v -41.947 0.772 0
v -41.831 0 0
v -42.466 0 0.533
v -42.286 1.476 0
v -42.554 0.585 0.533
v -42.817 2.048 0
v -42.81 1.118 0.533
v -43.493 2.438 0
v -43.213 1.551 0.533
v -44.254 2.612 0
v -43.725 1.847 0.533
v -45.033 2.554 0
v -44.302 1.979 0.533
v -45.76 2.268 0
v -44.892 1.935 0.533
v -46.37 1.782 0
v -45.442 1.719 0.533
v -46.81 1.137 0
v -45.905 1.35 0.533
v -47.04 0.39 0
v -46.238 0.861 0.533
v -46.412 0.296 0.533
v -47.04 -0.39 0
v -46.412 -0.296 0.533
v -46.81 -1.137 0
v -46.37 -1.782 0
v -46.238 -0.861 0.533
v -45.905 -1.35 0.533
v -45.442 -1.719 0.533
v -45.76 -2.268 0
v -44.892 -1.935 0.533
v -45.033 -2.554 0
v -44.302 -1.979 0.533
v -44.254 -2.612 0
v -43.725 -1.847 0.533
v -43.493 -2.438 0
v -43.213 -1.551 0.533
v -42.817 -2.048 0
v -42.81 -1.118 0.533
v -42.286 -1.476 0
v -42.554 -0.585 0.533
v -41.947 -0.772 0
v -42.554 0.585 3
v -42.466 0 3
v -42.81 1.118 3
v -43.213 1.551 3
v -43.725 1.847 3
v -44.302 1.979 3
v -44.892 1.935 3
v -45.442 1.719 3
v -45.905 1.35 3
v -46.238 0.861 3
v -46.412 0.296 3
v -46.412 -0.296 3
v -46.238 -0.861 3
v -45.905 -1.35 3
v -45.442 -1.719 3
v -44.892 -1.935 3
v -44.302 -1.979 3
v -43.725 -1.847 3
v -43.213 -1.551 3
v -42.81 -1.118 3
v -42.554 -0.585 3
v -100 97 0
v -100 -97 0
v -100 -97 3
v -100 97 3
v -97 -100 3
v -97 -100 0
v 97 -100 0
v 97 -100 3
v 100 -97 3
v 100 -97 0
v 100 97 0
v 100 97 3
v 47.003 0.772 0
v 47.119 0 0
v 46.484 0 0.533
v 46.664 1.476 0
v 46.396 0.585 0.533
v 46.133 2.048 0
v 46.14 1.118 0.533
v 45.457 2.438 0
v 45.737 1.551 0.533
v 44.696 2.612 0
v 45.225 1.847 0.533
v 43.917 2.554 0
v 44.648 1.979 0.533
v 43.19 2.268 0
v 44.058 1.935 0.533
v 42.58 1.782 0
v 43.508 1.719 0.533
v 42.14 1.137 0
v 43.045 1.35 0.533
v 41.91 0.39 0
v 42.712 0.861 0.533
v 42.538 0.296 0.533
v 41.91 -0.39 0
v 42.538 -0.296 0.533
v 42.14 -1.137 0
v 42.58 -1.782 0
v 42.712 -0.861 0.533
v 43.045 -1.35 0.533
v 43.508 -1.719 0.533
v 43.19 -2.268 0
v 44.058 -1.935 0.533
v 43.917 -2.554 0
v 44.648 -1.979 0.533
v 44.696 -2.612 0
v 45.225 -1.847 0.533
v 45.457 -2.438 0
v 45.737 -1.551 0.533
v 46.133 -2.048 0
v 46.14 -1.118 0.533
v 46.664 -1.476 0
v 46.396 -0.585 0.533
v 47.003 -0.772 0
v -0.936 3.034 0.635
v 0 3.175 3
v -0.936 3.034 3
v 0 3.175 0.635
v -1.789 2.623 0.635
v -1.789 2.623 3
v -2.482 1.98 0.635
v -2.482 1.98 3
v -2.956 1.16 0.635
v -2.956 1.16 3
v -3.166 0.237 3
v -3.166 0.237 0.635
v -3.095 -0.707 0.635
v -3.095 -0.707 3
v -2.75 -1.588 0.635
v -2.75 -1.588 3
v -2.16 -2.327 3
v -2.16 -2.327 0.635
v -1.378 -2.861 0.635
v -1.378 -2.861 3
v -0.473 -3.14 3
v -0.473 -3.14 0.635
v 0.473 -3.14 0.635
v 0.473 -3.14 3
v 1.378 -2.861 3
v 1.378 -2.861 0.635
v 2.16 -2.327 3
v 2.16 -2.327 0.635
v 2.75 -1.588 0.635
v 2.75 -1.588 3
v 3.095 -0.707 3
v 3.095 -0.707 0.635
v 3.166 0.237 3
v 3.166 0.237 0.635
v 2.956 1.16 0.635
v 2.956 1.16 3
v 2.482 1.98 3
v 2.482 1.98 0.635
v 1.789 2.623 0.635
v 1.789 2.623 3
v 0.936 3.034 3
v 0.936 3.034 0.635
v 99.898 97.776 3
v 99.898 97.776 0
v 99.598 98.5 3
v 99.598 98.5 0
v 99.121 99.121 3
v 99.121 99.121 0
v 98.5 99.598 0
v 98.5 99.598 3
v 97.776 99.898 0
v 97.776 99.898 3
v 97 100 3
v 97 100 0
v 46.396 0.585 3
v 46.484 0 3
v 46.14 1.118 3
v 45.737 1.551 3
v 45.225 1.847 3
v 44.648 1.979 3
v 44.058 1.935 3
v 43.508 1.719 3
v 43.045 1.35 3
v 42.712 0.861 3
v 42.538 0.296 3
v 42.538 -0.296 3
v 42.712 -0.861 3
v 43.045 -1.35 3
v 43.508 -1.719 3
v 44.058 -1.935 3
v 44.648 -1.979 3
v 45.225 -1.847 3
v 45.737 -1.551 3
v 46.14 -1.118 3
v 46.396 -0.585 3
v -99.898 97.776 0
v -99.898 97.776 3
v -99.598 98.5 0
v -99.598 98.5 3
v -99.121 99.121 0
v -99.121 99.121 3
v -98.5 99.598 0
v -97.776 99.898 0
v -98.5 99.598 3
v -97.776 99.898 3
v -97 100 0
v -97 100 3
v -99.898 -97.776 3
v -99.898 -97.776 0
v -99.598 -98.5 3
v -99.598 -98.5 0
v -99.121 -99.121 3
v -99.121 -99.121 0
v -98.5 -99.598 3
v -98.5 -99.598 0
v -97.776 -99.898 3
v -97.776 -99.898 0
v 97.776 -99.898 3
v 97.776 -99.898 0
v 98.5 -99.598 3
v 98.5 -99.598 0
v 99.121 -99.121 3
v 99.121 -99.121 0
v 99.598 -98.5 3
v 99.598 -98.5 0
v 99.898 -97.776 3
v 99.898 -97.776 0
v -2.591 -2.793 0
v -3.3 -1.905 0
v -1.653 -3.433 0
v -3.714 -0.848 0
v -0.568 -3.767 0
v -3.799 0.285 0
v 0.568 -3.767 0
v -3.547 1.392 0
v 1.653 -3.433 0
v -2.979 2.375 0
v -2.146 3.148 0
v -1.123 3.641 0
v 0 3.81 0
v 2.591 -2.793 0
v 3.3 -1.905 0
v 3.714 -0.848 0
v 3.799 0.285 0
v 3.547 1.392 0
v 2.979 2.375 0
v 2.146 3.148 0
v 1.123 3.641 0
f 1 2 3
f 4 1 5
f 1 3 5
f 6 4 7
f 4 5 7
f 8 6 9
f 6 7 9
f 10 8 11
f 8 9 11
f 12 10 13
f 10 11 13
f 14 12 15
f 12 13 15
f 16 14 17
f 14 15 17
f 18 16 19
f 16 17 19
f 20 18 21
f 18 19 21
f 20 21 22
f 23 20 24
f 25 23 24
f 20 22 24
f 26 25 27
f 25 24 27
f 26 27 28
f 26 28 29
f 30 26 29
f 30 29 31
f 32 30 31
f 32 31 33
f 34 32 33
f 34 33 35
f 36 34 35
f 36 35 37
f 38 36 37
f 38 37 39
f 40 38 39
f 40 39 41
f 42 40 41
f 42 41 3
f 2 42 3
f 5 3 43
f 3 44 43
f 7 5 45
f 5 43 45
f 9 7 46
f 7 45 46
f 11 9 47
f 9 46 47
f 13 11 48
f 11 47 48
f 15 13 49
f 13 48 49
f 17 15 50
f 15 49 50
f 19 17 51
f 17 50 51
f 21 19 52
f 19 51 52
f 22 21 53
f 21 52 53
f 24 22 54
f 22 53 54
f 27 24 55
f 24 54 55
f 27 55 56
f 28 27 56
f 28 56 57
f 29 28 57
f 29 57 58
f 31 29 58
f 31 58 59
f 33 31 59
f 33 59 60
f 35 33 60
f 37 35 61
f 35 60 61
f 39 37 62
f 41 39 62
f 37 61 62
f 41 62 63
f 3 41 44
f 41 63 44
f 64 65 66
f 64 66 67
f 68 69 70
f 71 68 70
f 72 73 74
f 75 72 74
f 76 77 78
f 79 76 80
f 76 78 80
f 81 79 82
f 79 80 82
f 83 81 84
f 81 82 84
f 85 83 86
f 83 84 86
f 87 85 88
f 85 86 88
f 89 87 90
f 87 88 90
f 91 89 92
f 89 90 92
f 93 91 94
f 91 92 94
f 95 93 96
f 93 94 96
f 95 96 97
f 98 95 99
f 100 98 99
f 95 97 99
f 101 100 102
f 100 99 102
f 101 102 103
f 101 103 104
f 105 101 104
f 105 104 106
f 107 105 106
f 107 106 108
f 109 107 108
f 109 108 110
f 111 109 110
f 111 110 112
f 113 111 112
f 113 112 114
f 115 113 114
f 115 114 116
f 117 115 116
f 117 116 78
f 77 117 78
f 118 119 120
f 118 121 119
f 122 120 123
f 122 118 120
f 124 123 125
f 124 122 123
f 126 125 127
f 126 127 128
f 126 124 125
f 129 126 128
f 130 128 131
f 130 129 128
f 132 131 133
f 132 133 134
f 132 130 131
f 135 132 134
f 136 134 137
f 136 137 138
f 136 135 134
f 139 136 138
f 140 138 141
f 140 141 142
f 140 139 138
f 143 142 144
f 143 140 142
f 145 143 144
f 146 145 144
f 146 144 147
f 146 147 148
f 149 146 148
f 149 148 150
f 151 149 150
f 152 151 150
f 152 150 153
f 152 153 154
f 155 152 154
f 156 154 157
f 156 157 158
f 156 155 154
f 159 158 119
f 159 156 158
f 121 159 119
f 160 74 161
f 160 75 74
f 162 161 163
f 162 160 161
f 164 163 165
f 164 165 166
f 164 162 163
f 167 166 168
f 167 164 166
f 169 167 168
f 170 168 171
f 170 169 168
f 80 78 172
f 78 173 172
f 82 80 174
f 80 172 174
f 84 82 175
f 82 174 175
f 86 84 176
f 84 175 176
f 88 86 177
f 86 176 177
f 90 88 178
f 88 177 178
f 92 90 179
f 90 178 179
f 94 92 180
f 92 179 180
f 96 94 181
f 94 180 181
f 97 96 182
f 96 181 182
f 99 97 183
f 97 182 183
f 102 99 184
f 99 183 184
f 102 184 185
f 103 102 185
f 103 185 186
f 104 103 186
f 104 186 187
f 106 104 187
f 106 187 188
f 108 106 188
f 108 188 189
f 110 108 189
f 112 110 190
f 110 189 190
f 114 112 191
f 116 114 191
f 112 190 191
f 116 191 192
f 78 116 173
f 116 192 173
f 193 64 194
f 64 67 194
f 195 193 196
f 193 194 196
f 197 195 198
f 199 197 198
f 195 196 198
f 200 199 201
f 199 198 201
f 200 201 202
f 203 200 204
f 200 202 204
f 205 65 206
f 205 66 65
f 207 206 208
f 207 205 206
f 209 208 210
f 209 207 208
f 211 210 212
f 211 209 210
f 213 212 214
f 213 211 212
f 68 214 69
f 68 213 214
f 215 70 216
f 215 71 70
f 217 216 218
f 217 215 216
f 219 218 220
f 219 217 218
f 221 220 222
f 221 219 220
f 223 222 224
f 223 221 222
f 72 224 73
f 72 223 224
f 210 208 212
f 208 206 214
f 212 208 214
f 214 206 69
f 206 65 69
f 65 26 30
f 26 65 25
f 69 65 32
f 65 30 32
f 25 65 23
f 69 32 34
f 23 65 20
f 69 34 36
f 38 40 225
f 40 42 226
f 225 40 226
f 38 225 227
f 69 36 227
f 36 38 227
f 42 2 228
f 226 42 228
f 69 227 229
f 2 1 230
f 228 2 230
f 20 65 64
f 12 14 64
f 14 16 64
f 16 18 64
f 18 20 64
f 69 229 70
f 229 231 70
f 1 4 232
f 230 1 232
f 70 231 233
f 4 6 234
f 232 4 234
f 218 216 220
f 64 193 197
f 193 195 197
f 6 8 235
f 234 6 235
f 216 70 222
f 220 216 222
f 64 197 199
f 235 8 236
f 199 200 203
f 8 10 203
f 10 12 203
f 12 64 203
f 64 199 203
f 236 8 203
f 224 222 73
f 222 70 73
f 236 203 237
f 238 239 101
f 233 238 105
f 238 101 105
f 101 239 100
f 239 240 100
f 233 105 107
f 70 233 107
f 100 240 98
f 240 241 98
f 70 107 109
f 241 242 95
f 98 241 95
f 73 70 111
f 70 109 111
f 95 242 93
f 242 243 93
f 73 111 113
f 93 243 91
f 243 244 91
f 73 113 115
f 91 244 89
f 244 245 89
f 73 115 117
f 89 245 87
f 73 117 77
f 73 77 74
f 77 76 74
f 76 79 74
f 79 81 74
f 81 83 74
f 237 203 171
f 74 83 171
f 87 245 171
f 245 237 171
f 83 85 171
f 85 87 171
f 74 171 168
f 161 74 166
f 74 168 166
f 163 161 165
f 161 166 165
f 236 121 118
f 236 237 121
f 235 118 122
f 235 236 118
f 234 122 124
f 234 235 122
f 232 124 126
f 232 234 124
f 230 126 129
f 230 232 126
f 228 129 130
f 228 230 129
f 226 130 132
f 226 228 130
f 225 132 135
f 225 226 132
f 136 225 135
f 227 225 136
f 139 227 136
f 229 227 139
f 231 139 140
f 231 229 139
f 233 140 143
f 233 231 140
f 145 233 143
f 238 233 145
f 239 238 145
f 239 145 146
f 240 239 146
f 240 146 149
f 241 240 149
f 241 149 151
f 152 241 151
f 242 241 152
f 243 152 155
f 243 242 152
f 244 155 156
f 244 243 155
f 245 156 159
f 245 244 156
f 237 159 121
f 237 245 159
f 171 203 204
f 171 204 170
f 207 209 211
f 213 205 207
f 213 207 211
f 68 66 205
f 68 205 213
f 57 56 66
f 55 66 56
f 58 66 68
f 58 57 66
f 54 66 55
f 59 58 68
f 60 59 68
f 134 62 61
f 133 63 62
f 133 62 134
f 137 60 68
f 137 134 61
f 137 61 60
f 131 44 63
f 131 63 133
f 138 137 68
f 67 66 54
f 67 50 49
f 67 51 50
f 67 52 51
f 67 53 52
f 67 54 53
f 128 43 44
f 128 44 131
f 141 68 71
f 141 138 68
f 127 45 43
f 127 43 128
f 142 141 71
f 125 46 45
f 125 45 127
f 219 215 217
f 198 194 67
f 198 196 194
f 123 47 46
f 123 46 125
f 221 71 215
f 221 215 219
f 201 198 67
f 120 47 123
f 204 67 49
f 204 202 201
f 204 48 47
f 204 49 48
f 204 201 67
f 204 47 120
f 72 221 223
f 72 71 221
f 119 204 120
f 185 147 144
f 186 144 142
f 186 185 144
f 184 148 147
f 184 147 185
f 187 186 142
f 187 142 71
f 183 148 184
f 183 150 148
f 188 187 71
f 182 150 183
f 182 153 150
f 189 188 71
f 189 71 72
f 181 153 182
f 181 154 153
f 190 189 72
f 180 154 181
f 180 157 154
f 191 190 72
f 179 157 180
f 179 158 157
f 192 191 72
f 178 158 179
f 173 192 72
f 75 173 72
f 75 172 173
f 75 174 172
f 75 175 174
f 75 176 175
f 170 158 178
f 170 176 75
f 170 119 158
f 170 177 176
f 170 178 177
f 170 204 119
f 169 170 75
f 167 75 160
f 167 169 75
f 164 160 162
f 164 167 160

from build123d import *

# Parameters (mm, degrees)
BASEPLATE_W                   = 200
BASEPLATE_H                   = 200
BOSS_EXTRUDE1_DEPTH           = 3
FILLET1_R                     = 3
F_5_32_DOWEL_HOLE_D           = 3.96875
F_5_32_DOWEL_HOLE_CSINK_D     = 5.23875
F_5_32_DOWEL_HOLE_CSINK_ANGLE = 100


with BuildPart() as part:
    # Baseplate → Boss-Extrude1 (new body)
    with BuildSketch(Plane.XY):
        Rectangle(BASEPLATE_W, BASEPLATE_H)
    extrude(amount=BOSS_EXTRUDE1_DEPTH)

    # Fillet1
    fillet1_edges = [part.edges().sort_by_distance(p)[0] for p in [
        (100, -100, 1.5),
        (-100, -100, 1.5),
        (-100, 100, 1.5),
        (100, 100, 1.5),
    ]]
    fillet(fillet1_edges, radius=FILLET1_R)

    # Sketch8 → 1/4 Inch Bolt Hole (revolve, cut)
    with BuildSketch(Plane.YZ):
        Polygon((0, 0), (0, 3), (3.175, 3), (3.175, 0.635), (3.81, 0), align=None)
    revolve(axis=Axis((0, 0, -6.35), (0, 0, 1)), mode=Mode.SUBTRACT)

    # 5/32 Dowel Hole (through all)
    with Locations(Plane(origin=(0, 0, 0), x_dir=(-1, 0, 0), z_dir=(0, 0, -1))):
        with Locations((-44.5, 0), (44.45, 0)):
            CounterSinkHole(F_5_32_DOWEL_HOLE_D / 2, F_5_32_DOWEL_HOLE_CSINK_D / 2, counter_sink_angle=F_5_32_DOWEL_HOLE_CSINK_ANGLE)


solid = part.part
